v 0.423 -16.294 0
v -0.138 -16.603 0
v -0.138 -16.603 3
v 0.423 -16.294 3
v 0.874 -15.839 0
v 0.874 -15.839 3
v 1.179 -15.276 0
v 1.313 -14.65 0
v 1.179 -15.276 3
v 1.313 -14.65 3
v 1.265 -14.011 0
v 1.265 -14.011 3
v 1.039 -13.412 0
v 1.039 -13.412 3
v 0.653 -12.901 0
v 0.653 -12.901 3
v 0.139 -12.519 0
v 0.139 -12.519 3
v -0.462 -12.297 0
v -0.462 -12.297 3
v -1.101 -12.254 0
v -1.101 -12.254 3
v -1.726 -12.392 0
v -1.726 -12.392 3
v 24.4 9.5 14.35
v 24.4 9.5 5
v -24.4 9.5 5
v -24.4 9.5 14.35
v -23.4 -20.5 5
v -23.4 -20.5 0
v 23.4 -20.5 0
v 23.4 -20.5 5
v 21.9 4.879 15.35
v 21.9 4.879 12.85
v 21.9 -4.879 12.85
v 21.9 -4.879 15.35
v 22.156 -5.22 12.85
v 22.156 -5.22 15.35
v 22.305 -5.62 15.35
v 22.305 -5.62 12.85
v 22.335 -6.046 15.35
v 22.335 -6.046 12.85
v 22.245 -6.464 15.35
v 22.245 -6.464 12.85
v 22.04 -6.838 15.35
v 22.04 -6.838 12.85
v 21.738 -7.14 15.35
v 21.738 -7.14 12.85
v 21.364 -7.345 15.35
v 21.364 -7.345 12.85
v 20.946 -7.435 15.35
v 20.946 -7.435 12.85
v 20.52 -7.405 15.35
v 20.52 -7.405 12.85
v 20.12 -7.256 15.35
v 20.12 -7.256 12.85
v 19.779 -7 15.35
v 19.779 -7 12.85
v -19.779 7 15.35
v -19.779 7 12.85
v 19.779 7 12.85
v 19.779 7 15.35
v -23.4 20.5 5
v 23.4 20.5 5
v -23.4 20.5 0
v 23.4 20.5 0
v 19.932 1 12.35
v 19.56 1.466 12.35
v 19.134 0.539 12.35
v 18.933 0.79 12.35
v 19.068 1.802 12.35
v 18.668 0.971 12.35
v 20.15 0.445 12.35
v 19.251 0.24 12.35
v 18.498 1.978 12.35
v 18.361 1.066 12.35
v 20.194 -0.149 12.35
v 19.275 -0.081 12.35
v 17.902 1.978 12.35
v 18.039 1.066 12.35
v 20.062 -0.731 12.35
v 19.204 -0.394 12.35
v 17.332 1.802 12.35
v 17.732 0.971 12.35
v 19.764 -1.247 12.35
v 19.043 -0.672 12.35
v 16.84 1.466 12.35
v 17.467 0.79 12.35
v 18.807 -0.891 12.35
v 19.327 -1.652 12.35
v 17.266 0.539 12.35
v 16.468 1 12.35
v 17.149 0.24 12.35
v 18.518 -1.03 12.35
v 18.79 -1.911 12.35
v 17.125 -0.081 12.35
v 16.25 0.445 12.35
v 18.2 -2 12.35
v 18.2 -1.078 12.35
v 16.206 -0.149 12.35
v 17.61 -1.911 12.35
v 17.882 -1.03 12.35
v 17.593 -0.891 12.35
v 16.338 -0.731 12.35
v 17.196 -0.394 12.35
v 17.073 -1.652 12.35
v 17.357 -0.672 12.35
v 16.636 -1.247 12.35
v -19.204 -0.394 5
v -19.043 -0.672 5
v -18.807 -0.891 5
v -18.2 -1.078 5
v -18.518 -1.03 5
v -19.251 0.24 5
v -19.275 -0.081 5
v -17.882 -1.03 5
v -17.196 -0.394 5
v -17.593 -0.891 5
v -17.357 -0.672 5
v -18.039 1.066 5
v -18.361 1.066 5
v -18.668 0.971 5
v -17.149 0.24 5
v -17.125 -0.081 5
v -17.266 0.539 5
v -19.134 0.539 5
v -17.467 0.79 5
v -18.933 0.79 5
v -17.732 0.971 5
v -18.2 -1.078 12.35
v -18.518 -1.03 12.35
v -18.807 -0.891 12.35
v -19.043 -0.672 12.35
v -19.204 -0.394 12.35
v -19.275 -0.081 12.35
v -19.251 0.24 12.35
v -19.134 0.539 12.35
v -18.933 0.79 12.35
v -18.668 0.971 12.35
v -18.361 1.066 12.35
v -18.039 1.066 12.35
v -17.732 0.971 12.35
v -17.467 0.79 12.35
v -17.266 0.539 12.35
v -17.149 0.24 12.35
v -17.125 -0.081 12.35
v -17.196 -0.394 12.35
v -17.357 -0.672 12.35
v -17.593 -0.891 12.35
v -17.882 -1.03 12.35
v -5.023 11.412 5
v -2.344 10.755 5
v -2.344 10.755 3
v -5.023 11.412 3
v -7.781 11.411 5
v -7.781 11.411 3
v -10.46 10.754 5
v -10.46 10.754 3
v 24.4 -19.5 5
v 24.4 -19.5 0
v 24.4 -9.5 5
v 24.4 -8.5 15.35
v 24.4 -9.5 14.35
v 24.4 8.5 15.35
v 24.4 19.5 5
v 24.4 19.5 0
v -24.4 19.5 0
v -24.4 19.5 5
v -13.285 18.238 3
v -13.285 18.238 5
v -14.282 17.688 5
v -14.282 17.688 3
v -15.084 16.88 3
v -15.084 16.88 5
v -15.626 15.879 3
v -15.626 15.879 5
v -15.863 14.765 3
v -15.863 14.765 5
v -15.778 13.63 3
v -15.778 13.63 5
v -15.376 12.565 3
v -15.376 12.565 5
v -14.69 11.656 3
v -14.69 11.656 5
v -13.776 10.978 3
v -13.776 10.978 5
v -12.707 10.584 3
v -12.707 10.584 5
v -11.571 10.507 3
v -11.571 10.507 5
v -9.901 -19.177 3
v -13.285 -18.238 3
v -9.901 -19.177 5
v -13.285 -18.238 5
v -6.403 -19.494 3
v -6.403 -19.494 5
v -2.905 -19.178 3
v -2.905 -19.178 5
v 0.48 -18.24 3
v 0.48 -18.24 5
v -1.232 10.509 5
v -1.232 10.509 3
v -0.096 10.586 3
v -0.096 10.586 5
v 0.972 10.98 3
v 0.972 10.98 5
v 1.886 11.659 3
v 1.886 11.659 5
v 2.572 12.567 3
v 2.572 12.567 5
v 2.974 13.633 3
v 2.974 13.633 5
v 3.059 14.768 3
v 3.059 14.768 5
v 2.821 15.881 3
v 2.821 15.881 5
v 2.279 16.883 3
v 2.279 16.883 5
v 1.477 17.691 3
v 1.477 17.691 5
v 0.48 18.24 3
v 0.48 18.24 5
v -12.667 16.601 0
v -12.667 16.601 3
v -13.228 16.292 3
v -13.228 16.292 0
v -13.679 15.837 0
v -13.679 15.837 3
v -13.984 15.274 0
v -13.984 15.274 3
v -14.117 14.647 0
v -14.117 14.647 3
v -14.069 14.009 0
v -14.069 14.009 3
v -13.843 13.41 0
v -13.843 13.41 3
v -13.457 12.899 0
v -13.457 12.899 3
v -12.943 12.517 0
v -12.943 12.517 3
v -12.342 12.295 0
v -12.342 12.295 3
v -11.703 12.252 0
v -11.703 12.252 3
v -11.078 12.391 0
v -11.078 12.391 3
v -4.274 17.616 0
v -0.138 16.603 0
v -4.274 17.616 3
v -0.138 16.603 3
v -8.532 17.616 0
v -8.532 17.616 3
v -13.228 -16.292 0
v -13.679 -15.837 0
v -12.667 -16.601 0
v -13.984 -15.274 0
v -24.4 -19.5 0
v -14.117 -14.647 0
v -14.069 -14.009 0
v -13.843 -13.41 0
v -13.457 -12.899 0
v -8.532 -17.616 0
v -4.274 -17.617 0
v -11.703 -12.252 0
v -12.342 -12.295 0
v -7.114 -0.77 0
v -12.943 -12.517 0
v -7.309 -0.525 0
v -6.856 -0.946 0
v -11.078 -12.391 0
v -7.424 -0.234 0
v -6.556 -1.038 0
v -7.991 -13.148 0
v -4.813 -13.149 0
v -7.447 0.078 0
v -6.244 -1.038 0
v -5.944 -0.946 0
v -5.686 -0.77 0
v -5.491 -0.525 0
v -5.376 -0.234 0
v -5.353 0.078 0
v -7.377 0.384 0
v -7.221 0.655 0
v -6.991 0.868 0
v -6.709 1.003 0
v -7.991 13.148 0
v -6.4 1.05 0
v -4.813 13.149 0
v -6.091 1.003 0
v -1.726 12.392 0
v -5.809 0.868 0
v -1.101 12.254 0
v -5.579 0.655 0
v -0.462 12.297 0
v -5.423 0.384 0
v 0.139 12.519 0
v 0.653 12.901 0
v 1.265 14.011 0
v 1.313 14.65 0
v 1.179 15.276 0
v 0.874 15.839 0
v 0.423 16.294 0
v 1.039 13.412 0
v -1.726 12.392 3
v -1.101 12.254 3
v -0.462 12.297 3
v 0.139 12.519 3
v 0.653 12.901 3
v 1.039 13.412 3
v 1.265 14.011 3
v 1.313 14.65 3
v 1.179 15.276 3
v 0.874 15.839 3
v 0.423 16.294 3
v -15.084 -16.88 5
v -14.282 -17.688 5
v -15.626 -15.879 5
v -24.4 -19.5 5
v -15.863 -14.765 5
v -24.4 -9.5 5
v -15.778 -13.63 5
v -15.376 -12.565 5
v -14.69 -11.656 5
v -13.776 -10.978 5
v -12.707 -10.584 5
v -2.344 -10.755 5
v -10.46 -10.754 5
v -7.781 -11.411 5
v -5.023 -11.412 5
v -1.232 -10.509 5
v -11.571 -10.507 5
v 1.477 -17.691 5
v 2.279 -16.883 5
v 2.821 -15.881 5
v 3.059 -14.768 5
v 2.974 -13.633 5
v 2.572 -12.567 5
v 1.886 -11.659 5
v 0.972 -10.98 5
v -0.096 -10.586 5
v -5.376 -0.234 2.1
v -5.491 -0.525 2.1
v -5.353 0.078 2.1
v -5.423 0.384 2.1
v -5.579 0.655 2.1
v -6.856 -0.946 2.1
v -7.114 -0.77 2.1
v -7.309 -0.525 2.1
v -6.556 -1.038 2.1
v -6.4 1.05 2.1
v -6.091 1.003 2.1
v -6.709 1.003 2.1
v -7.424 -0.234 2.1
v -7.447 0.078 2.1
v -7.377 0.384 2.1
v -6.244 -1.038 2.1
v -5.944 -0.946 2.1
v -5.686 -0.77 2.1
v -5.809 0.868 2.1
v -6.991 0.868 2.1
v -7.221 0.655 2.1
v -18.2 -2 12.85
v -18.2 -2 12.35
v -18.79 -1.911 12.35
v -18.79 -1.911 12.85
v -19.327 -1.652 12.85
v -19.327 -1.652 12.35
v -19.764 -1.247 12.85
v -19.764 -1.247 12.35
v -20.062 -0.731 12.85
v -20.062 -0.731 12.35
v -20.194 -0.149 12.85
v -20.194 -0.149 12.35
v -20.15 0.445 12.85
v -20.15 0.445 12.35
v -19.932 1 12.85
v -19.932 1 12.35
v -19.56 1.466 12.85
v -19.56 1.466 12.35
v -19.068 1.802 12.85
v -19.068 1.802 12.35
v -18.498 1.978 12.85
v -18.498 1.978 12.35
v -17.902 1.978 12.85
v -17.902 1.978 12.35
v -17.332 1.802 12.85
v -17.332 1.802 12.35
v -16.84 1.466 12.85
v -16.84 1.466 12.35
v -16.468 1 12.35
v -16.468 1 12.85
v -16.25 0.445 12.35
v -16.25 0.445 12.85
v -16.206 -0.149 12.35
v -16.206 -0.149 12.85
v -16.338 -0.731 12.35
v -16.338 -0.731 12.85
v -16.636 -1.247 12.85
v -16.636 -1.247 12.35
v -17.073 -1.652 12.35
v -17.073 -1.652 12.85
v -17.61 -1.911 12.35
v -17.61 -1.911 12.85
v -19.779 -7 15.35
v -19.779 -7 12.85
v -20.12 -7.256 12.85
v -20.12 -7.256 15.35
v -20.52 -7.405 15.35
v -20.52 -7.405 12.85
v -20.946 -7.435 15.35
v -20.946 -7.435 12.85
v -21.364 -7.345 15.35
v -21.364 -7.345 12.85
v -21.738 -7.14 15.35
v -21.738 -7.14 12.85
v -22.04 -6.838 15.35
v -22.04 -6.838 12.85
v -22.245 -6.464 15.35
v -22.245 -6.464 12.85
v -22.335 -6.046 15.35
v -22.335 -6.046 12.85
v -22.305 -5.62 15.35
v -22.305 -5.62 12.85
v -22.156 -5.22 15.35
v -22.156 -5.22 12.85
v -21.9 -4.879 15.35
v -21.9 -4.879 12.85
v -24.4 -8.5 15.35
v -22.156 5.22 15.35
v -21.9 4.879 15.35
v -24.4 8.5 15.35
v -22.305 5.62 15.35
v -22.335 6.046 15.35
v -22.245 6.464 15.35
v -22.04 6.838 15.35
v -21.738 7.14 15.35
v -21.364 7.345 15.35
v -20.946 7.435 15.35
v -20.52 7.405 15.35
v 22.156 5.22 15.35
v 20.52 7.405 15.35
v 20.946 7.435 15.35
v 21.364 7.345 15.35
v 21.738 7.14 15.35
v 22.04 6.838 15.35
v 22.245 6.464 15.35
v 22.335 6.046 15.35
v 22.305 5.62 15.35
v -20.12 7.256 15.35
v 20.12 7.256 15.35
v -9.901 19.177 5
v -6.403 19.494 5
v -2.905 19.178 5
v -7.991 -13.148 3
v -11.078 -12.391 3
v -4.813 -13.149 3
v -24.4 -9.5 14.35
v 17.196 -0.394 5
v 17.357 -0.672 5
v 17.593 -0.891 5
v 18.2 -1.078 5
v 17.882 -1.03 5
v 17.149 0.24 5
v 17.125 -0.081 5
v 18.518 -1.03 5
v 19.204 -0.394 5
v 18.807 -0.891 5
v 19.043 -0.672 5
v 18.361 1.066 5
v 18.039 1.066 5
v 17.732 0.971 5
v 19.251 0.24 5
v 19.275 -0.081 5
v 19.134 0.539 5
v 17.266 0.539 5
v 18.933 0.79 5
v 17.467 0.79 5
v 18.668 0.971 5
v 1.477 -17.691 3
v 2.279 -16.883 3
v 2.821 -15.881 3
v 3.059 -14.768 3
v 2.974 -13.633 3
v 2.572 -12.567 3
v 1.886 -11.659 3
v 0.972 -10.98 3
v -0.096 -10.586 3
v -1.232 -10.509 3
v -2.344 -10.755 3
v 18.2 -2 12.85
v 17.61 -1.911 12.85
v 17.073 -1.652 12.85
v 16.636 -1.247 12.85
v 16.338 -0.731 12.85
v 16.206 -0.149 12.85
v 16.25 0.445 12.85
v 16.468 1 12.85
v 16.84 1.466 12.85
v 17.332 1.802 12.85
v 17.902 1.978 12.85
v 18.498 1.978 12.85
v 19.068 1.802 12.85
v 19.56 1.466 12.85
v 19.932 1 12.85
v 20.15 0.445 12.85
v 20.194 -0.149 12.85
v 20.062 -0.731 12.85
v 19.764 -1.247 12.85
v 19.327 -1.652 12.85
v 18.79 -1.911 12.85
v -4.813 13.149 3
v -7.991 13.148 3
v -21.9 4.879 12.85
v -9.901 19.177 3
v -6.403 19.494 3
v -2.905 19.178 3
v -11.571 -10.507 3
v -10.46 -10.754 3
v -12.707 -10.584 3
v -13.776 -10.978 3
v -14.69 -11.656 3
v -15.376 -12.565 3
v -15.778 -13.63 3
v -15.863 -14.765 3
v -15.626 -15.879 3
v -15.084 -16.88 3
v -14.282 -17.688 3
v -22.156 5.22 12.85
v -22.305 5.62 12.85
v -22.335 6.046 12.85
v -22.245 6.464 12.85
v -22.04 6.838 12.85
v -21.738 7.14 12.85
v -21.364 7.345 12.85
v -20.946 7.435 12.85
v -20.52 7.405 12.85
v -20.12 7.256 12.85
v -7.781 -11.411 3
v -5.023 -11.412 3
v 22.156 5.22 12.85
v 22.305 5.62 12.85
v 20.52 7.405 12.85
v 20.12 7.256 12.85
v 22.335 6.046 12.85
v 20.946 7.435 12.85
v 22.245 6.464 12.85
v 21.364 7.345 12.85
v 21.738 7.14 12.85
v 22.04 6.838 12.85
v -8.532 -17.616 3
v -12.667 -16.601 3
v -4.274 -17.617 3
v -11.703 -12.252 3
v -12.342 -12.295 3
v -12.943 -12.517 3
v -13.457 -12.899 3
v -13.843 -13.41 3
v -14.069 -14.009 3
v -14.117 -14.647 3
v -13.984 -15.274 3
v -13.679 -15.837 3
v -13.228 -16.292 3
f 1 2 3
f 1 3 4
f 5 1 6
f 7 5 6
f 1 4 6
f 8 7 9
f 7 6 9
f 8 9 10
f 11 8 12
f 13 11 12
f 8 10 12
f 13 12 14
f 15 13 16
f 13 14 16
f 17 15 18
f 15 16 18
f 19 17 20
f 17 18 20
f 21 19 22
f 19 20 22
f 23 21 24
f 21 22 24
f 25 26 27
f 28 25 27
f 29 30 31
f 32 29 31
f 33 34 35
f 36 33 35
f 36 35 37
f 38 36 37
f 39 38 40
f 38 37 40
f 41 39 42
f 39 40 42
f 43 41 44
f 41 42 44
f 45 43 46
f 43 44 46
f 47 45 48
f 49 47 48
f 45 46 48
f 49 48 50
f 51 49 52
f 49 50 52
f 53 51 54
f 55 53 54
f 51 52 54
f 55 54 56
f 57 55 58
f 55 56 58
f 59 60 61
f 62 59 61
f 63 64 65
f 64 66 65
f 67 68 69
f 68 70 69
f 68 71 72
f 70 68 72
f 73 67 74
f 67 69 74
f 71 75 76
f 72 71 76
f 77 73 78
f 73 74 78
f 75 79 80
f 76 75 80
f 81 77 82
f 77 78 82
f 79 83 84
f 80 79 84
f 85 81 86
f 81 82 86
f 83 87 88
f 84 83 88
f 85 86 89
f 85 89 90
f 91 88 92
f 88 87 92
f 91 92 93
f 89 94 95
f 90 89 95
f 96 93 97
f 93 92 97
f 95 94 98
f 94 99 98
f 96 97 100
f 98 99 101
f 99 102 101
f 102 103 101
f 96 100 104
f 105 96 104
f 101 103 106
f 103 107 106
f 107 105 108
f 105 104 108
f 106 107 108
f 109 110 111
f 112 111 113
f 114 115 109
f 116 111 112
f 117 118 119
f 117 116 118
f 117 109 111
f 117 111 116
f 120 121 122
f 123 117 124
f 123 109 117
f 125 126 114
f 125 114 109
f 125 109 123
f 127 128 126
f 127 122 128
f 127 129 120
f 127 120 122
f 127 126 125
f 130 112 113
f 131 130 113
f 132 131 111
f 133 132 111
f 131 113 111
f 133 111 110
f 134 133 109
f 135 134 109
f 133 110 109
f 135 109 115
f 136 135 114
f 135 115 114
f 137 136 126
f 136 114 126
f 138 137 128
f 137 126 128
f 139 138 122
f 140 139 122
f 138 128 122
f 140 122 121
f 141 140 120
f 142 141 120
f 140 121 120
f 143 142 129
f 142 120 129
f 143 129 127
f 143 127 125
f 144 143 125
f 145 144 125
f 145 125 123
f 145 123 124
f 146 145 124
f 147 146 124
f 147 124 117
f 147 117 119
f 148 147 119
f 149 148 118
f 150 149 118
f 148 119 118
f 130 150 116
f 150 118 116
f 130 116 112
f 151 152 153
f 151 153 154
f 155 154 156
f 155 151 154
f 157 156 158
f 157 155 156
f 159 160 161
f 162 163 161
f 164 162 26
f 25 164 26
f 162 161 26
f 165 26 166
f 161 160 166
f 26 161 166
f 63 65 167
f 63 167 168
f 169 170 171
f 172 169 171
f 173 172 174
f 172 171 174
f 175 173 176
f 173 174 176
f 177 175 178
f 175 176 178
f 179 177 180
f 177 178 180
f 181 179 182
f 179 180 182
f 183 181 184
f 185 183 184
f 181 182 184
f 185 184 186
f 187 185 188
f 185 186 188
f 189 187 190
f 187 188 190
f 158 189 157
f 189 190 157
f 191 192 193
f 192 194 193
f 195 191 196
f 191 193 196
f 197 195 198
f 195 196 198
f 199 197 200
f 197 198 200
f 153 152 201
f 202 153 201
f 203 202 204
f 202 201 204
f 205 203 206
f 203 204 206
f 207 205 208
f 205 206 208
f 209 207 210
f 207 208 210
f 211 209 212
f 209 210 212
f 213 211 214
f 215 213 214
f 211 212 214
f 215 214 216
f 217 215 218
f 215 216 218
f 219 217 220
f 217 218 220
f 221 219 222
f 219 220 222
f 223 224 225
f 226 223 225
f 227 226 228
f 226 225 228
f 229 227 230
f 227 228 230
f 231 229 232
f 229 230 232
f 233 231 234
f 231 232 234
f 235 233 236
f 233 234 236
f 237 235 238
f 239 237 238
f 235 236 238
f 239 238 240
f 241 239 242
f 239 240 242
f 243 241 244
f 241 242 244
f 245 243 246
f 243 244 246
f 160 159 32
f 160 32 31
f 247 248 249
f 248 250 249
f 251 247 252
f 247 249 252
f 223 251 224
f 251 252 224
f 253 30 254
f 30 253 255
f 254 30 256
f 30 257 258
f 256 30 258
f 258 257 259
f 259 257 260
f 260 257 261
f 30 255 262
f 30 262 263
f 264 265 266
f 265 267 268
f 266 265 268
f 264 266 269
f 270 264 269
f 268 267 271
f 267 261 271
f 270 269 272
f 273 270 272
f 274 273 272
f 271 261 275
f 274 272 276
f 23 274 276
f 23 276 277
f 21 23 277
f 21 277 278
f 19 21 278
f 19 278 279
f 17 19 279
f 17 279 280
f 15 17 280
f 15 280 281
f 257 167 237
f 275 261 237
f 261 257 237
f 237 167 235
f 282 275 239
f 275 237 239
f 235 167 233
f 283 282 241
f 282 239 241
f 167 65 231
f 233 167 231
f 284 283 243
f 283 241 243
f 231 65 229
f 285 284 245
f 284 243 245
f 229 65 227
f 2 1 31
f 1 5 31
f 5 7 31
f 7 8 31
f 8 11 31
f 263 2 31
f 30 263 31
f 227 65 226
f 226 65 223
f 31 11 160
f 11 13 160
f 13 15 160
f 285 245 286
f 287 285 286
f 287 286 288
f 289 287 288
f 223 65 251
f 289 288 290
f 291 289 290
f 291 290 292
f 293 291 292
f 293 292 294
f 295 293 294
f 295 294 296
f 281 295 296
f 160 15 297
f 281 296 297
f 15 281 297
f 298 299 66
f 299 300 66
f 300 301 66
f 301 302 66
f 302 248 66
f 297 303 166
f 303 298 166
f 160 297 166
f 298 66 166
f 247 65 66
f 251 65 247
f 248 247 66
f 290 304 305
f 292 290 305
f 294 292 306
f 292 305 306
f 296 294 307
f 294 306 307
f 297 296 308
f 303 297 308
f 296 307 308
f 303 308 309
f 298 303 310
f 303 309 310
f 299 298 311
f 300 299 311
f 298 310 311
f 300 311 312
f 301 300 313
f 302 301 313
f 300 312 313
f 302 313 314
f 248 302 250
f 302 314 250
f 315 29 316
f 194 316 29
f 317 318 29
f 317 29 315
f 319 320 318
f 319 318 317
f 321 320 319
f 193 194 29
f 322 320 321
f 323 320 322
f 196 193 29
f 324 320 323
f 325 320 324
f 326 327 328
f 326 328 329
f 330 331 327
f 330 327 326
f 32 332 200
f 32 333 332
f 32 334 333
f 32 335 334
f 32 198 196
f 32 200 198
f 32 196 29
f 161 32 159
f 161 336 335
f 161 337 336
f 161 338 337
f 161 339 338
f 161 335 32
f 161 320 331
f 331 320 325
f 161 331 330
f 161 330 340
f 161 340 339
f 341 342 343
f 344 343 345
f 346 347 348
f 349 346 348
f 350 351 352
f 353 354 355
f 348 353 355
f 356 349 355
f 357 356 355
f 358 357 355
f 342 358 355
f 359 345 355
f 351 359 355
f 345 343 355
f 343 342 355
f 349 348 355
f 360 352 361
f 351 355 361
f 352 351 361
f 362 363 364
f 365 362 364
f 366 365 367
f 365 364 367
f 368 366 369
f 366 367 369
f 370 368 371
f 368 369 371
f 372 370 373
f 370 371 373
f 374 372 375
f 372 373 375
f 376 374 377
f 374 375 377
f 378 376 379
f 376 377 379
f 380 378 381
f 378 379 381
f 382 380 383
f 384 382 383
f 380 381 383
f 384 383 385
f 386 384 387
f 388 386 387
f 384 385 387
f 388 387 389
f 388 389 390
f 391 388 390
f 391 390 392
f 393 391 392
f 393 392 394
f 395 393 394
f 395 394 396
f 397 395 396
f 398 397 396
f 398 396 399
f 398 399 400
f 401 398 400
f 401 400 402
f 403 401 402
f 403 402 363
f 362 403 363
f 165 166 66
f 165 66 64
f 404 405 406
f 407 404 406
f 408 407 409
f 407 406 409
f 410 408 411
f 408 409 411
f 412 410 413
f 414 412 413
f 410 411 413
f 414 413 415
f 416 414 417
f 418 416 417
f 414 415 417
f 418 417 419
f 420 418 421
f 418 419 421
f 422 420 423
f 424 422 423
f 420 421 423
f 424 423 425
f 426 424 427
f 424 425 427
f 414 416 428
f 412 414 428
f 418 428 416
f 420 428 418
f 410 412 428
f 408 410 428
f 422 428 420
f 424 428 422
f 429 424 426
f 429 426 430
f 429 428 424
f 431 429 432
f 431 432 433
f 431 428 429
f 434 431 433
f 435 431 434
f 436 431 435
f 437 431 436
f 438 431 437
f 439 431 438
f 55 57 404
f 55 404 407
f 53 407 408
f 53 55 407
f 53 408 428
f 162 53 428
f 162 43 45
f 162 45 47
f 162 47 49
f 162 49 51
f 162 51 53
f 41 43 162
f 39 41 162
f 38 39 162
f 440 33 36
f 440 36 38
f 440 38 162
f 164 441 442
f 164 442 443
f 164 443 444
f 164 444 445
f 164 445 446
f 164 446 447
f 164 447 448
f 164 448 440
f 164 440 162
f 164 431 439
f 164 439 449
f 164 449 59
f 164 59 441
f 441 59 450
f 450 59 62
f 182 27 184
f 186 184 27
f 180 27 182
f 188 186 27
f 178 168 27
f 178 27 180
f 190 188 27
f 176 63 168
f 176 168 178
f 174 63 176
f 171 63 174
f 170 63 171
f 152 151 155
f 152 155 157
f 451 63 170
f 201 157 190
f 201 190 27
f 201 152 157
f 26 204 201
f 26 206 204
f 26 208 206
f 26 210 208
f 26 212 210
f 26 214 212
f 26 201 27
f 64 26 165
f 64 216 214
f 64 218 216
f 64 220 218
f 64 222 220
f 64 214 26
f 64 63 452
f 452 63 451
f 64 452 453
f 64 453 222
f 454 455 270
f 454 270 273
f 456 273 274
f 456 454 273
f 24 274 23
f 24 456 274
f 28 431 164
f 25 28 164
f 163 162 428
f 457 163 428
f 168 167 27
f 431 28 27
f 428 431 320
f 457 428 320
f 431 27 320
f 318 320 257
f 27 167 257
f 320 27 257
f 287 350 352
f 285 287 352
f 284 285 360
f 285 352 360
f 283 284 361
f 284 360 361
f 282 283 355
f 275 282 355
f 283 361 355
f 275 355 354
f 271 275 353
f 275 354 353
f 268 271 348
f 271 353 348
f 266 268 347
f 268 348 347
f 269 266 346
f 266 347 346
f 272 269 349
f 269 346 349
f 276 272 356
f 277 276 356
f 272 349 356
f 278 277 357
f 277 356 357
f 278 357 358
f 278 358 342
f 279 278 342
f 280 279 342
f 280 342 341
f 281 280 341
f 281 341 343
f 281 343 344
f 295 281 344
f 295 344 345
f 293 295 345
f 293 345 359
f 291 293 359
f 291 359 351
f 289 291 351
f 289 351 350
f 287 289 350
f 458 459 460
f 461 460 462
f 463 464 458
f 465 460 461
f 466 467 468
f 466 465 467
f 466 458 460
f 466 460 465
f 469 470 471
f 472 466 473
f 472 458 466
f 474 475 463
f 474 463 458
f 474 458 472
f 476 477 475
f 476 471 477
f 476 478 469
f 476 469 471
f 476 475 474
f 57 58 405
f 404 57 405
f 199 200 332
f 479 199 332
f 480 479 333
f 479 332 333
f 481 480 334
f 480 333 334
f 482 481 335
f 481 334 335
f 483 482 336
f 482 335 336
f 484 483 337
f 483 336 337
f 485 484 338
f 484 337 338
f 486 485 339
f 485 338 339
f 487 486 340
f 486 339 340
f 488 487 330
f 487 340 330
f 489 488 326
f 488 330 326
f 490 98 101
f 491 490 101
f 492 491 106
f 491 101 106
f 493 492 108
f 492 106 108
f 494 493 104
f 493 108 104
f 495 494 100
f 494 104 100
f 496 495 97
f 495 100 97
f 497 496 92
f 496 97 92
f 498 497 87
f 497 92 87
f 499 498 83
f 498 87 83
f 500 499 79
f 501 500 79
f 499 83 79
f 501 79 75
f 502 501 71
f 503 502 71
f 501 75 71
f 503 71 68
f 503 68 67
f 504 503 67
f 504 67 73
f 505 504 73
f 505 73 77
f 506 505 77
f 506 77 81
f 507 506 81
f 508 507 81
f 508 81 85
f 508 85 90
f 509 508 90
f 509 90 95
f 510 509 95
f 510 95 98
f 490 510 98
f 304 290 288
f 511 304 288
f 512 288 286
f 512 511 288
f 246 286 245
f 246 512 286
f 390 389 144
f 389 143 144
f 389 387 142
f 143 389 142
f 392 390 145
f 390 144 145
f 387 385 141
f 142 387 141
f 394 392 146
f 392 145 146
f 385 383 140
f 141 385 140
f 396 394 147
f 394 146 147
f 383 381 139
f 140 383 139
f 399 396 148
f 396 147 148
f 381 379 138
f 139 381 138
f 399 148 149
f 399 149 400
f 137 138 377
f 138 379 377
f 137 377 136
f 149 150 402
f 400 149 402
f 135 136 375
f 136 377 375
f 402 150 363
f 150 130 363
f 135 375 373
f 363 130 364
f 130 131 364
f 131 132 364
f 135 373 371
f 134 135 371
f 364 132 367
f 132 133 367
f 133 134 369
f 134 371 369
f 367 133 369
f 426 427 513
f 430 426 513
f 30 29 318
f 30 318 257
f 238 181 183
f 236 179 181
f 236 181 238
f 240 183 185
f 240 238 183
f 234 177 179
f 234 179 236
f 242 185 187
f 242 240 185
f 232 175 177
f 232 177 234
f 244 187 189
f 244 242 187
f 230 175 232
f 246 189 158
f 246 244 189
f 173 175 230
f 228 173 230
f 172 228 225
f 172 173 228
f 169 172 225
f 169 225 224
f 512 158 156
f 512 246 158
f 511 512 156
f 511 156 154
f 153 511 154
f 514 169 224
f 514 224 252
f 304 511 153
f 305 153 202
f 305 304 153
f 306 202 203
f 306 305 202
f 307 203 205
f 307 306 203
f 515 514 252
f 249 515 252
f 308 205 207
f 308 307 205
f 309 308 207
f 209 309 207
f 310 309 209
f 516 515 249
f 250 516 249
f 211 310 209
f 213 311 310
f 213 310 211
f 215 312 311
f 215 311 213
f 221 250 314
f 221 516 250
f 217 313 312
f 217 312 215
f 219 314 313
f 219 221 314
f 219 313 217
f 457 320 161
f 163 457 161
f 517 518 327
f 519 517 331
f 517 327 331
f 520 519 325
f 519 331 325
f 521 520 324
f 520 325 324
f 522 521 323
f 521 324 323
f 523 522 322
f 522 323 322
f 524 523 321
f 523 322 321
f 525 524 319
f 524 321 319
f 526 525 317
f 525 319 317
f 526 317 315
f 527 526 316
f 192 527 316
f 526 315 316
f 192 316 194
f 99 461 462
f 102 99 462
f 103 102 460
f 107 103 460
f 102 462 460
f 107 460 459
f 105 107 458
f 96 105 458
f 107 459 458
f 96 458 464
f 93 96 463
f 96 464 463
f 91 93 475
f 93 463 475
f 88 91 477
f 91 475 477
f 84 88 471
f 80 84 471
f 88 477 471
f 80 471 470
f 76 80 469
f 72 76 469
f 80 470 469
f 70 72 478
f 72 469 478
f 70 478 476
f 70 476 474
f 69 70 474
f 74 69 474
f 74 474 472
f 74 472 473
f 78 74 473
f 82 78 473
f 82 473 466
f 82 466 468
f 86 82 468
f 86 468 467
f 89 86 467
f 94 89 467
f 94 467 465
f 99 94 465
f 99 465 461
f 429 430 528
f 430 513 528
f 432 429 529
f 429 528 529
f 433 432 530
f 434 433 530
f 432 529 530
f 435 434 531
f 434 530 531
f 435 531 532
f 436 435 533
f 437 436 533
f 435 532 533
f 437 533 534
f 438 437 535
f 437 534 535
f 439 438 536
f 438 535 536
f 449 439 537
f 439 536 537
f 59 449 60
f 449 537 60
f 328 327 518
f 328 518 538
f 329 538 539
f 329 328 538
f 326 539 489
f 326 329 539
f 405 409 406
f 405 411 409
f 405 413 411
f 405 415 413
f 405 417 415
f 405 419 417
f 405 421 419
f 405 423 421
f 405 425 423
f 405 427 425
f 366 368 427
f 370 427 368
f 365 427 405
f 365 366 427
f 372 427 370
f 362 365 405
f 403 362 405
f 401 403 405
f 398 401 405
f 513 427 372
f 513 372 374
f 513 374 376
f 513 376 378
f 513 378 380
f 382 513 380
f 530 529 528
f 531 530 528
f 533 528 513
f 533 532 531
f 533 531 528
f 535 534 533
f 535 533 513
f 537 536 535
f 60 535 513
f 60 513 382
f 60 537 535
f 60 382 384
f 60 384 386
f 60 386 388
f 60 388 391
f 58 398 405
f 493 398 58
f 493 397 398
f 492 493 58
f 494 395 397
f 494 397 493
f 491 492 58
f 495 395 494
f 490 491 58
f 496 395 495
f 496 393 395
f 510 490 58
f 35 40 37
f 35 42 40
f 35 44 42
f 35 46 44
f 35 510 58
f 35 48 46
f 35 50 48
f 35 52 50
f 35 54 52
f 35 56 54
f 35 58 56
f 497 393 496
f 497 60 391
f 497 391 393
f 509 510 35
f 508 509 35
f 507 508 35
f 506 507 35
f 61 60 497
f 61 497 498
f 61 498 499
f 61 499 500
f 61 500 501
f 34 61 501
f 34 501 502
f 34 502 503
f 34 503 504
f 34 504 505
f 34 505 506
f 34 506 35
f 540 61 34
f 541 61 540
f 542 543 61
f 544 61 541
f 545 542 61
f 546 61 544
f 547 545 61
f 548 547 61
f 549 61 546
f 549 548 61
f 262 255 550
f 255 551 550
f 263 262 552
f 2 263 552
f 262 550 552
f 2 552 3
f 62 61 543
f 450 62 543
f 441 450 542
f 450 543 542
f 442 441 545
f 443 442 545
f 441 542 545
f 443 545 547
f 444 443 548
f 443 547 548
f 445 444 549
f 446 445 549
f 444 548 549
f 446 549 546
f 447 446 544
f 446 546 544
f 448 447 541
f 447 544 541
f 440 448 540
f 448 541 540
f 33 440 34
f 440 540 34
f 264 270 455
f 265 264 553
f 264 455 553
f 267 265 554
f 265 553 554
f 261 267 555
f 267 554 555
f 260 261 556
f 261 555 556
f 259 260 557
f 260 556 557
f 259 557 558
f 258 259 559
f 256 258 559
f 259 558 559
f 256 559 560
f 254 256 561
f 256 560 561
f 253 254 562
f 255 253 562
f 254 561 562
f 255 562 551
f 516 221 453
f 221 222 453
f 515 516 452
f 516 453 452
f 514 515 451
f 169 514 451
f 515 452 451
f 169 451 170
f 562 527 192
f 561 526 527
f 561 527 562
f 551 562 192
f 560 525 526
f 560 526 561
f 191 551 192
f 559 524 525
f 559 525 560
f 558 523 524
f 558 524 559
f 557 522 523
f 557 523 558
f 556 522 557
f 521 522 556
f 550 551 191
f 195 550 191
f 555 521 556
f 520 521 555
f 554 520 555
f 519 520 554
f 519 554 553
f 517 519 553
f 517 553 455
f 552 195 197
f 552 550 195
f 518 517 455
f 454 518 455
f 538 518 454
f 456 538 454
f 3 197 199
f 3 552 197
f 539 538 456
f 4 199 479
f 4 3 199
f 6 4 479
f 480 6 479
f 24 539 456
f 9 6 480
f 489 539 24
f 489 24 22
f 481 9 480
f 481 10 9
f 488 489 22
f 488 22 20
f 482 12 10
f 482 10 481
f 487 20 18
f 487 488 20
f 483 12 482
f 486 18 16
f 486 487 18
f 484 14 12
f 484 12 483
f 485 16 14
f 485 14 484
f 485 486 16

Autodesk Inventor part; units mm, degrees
ref_plane "YZ Plane" through (0, 0, 0) normal (1, 0, 0) x (0, 1, 0)
ref_plane "XZ Plane" through (0, 0, 0) normal (0, 1, 0) x (-1, 0, 0)
ref_plane "XY Plane" through (0, 0, 0) normal (0, 0, 1) x (1, 0, 0)
sketch "Sketch1" plane through (0, 0, 0) normal (0, 0, 1) x (1, 0, 0)
  line L0 (-24.4, -9.5) -> (24.4, -9.5)
  line L1 (24.4, -9.5) -> (24.4, 9.5)
  line L2 (24.4, 9.5) -> (-24.4, 9.5)
  line L3 (-24.4, 9.5) -> (-24.4, -9.5)
  line L4 (-24.4, -9.5) -> (24.4, 9.5) construction
  line L5 (24.4, -9.5) -> (-24.4, 9.5) construction
  point P0 (0, 0)
  dimension "LENGTH" = 48.8
  dimension "WIDTH" = 19
extrude "Extrusion1" add sketch "Sketch1" along normal blind 12.85
sketch "Sketch2" plane through (0, 0, 12.85) normal (0, 0, 1) x (1, 0, 0)
  point P0 (0, 0)
  point P1 (-18.2, 0)
  point P2 (18.2, 0)
  dimension "d11" = 0
  dimension "d12" = 0
  dimension "d13" = 36.4
  dimension "d14" = 18.2
hole "Hole1" at (-18.2, 0, 12.85) at (18.2, 0, 12.85) direction (0, 0, -1) diameter 2.1565 depth 8.87 thread size "4-40 UNC" class "2B" standard "ANSI Unified Screw Threads"
sketch "Sketch3" plane through (0, 0, 12.85) normal (0, 0, 1) x (1, 0, 0)
  point P0 (0, 0)
  point P1 (0, 0)
  dimension "d22" = 0
  dimension "d23" = 0
hole "Hole2" [suppressed]
sketch "Sketch4" plane through (0, 0, 0) normal (0, 0, -1) x (-1, 0, 0)
  line L0 (5.5, 0) -> (4.5, 0) construction
  line L1 (5.5, 1.05) -> (4.5, 1.05)
  line L2 (4.5, -1.05) -> (5.5, -1.05)
  arc A0 (5.5, -1.05) -> (5.5, 1.05) centre (5.5, 0) ccw
  arc A1 (4.5, 1.05) -> (4.5, -1.05) centre (4.5, 0) ccw
  point P0 (0, 0)
  point P1 (-5, 0)
  point P2 (5, 0)
  dimension "d24" = 1
  dimension "d25" = 0
  dimension "d26" = 0
  dimension "d27" = 10
  dimension "d28" = 5
  dimension "d29" = 1.05
hole "Hole3" [suppressed]
extrude "Extrusion2" [suppressed]
sketch "Sketch5" plane through (0, 0, 0) normal (0, 0, 1) x (1, 0, 0)
  line L0 (-24.4, -20.5) -> (24.4, -20.5)
  line L1 (24.4, -20.5) -> (24.4, 20.5)
  line L2 (24.4, 20.5) -> (-24.4, 20.5)
  line L3 (-24.4, 20.5) -> (-24.4, -20.5)
  line L4 (-24.4, -20.5) -> (24.4, 20.5) construction
  line L5 (24.4, -20.5) -> (-24.4, 20.5) construction
  point P0 (0, 0)
  dimension "d39" = 48.8
  dimension "d40" = 41
extrude "Extrusion3" add sketch "Sketch5" along normal blind 5
sketch "Sketch7" plane through (0, 0, 12.85) normal (0, 0, 1) x (1, 0, 0)
  circle A0 centre (18.2, 0) radius 1.0782 projected
  circle A1 centre (-18.2, 0) radius 1.0782 projected
  point P0 (0, 0)
  dimension "d54" = 0
  dimension "d55" = 0
  dimension "d56" = 0
  dimension "d57" = 0
hole "Hole5" at (18.2, 0, 12.85) at (-18.2, 0, 12.85) direction (0, 0, -1) diameter 4 depth 0.5
chamfer "Chamfer2" distance 1 angle 45 4 edges at (24.4, -20.5, 2.5) (24.4, 20.5, 2.5) (-24.4, 20.5, 2.5) (-24.4, -20.5, 2.5)
sketch "Sketch8" plane through (0, 0, 0) normal (0, 0, -1) x (-1, 0, 0)
  line L0 (0, 5.5) -> (0, 4.5) construction
  line L1 (-1.05, 5.5) -> (-1.05, 4.5)
  line L2 (1.05, 4.5) -> (1.05, 5.5)
  arc A0 (1.05, 5.5) -> (-1.05, 5.5) centre (0, 5.5) ccw
  arc A1 (-1.05, 4.5) -> (1.05, 4.5) centre (0, 4.5) ccw
  point P0 (0, 0)
  point P1 (0, -5)
  point P2 (0, 5)
  dimension "d77" = 1
  dimension "d78" = 1.05
  dimension "d79" = 10
  dimension "d80" = 0
  dimension "d81" = 0
  dimension "d82" = 5
hole "Hole6" [suppressed]
extrude "Extrusion4" [suppressed]
sketch "Sketch9" plane through (-24.4, -19.5, 0) normal (-1, 0, 0) x (0, 0, 1)
  circle A0 centre (-12.35, 19.5) radius 12.7
  line L0 (0, 39) -> (0, 0) projected
  point P0 (0, 19.5)
  point P1 (0, 16.539)
  point P2 (0, 22.461)
  dimension "d92" = 25.4
  dimension "d93" = 0
  dimension "d94" = 12.35
extrude "Extrusion5" [suppressed]
sketch "Sketch10" plane through (0, 0, 12.85) normal (0, 0, 1) x (1, 0, 0)
  line L0 (-24.4, -9.5) -> (24.4, -9.5)
  line L1 (24.4, -9.5) -> (24.4, 9.5)
  line L2 (24.4, 9.5) -> (-24.4, 9.5)
  line L3 (-24.4, 9.5) -> (-24.4, -9.5)
  line L4 (-24.4, -9.5) -> (24.4, 9.5) construction
  line L5 (24.4, -9.5) -> (-24.4, 9.5) construction
  line L6 (21.9, -7) -> (-21.9, -7)
  line L7 (-21.9, -7) -> (-21.9, 7)
  line L8 (-21.9, 7) -> (21.9, 7)
  line L9 (21.9, 7) -> (21.9, -7)
  line L10 (21.9, -7) -> (-21.9, 7) construction
  line L11 (-21.9, -7) -> (21.9, 7) construction
  circle A0 centre (-20.8393, 5.9393) radius 1.5
  circle A1 centre (-20.8393, -5.9393) radius 1.5
  circle A2 centre (20.8393, 5.9393) radius 1.5
  circle A3 centre (20.8393, -5.9393) radius 1.5
  line L12 (20.8393, 5.9393) -> (21.9, 7)
  line L13 (21.9, -7) -> (20.8393, -5.9393)
  line L14 (-20.8393, 5.9393) -> (-21.9, 7)
  line L15 (-20.8393, -5.9393) -> (-21.9, -7)
  point P0 (0, 0)
  point P1 (21.9, -4.8787)
  point P2 (19.7787, -7)
  point P3 (-19.7787, -7)
  point P4 (-21.9, -4.8787)
  point P5 (-21.9, 4.8787)
  point P6 (-19.7787, 7)
  point P7 (19.7787, 7)
  point P8 (21.9, 4.8787)
  dimension "d106" = 3
  dimension "d110" = 3
  dimension "d111" = 3
  dimension "d112" = 3
  dimension "d97" = 48.8
  dimension "d98" = 19
  dimension "d99" = 43.8
  dimension "d100" = 14
  dimension "d107" = 45
  dimension "d108" = 45
  dimension "d109" = 45
extrude "Extrusion6" add sketch "Sketch10" along normal blind 2.5
chamfer "Chamfer5" [suppressed]
chamfer "Chamfer6" distance 1 angle 45 2 edges at (0, -9.5, 15.35) (0, 9.5, 15.35)
sketch "Sketch12" plane through (0, 0, 5) normal (0, 0, 1) x (1, 0, 0)
  arc A0 (7.9961, 15.4962) -> (-8.004, 14.5013) centre (9.4196, -136.543) ccw construction
  arc A1 (7.9587, 19.496) -> (-8.4624, 18.4749) centre (9.4196, -136.543) ccw
  arc A2 (8.0336, 11.4964) -> (-7.5457, 10.5276) centre (9.4196, -136.543) ccw
  arc A3 (8.0336, 11.4964) -> (7.9587, 19.496) centre (7.9961, 15.4962) ccw
  arc A4 (-8.4624, 18.4749) -> (-7.5457, 10.5276) centre (-8.004, 14.5013) ccw
  line L0 (24.4, 2.961) -> (24.4, -2.961)
  line L1 (24.4, 0) -> (-24.4, 0)
  line L2 (-24.4, 8.5) -> (-24.4, -8.5)
  arc A5 (7.9961, 15.4962) -> (-8.004, 14.5013) centre (9.4196, -136.543) ccw construction
  arc A6 (7.9751, 17.7461) -> (-8.2619, 16.7364) centre (9.4196, -136.543) ccw
  arc A7 (8.0172, 13.2463) -> (-7.7462, 12.2661) centre (9.4196, -136.543) ccw
  arc A8 (8.0172, 13.2463) -> (7.9751, 17.7461) centre (7.9961, 15.4962) ccw
  arc A9 (-8.2619, 16.7364) -> (-7.7462, 12.2661) centre (-8.004, 14.5013) ccw
  arc A10 (-8.004, -14.5013) -> (7.9961, -15.4962) centre (9.4196, 136.543) ccw construction
  arc A11 (-8.4624, -18.4749) -> (7.9587, -19.496) centre (9.4196, 136.543) ccw
  arc A12 (-7.5457, -10.5276) -> (8.0336, -11.4964) centre (9.4196, 136.543) ccw
  arc A13 (7.9587, -19.496) -> (8.0336, -11.4964) centre (7.9961, -15.4962) ccw
  arc A14 (-7.5457, -10.5276) -> (-8.4624, -18.4749) centre (-8.004, -14.5013) ccw
  arc A15 (-8.004, -14.5013) -> (7.9961, -15.4962) centre (9.4196, 136.543) ccw construction
  arc A16 (-8.2619, -16.7364) -> (7.9751, -17.7461) centre (9.4196, 136.543) ccw
  arc A17 (-7.7462, -12.2661) -> (8.0172, -13.2463) centre (9.4196, 136.543) ccw
  arc A18 (7.9751, -17.7461) -> (8.0172, -13.2463) centre (7.9961, -15.4962) ccw
  arc A19 (-7.7462, -12.2661) -> (-8.2619, -16.7364) centre (-8.004, -14.5013) ccw
  point P0 (0, 0)
  point P1 (-8.004, 12.753)
  point P2 (7.9961, 17.2527)
  point P3 (-6.4165, 14.3405)
  point P4 (9.5836, 18.8402)
  point P5 (-8.004, -12.753)
  point P6 (7.9961, -17.2527)
  point P7 (9.5836, -18.8402)
  point P8 (-6.4165, -14.3405)
  dimension "d118" = 8
  dimension "d122" = 4.5
extrude "Extrusion12" [suppressed]
extrude "Extrusion13" [suppressed]
sketch "Sketch14" plane through (0, 0, 0) normal (0, 0, -1) x (-1, 0, 0)
  point P0 (0, 0)
  point P1 (6.4, 0)
hole "Hole7" at (-6.4, 0, 0) direction (0, 0, 1) diameter 2.1 depth 2.1
sketch "Sketch15" plane through (0, 0, 0) normal (0, 0, -1) x (-1, 0, 0)
  circle A0 centre (6.4, 0) radius 1.05 projected
  circle A1 centre (6.4, 0) radius 19.5
  circle A2 centre (6.4, 0) radius 11.5
  circle A3 centre (6.4, 0) radius 17.75
  circle A4 centre (6.4, 0) radius 13.25
  line L0 (-24.4, 9.5) -> (24.4, 9.5) projected
  line L1 (24.4, 9.5) -> (-24.4, 9.5)
  line L2 (-24.4, -19.5) -> (-24.4, 19.5) projected
  line L3 (24.4, -9.5) -> (-24.4, -9.5) projected
  line L4 (24.4, -9.5) -> (-24.4, -9.5)
  arc A5 (9.3371, 17.5053) -> (5.1369, 17.705) centre (6.4, 0) ccw
  arc A6 (8.5925, 13.0673) -> (5.4572, 13.2164) centre (6.4, 0) ccw
  arc A7 (13.9857, 17.9641) -> (-1.4292, 17.8592) centre (6.4, 0) ccw
  arc A8 (10.8736, 10.5942) -> (1.7828, 10.5324) centre (6.4, 0) ccw
  arc A9 (11.8707, 14.5025) -> (0.9294, 14.5025) centre (6.4, 0) ccw construction
  arc A10 (13.2825, 18.2451) -> (-0.4824, 18.2451) centre (6.4, 0) ccw
  arc A11 (10.4589, 10.7599) -> (2.3412, 10.7599) centre (6.4, 0) ccw
  arc A12 (10.4589, 10.7599) -> (13.2825, 18.2451) centre (11.8707, 14.5025) ccw
  arc A13 (-0.4824, 18.2451) -> (2.3412, 10.7599) centre (0.9294, 14.5025) ccw
  arc A14 (11.8707, 14.5025) -> (0.9294, 14.5025) centre (6.4, 0) ccw construction
  arc A15 (12.6648, 16.6077) -> (0.1352, 16.6077) centre (6.4, 0) ccw
  arc A16 (11.0766, 12.3973) -> (1.7235, 12.3973) centre (6.4, 0) ccw
  arc A17 (11.0766, 12.3973) -> (12.6648, 16.6077) centre (11.8707, 14.5025) ccw
  arc A18 (0.1352, 16.6077) -> (1.7235, 12.3973) centre (0.9294, 14.5025) ccw
  line L5 (24.4, 8.5) -> (24.4, -8.5) projected
  line L6 (24.4, 0) -> (-24.4, 0)
  arc A19 (5.1369, -17.705) -> (9.3371, -17.5053) centre (6.4, 0) ccw
  arc A20 (5.4572, -13.2164) -> (8.5925, -13.0673) centre (6.4, 0) ccw
  arc A21 (-1.4292, -17.8592) -> (13.9857, -17.9641) centre (6.4, 0) ccw
  arc A22 (1.7828, -10.5324) -> (10.8736, -10.5942) centre (6.4, 0) ccw
  arc A23 (0.9294, -14.5025) -> (11.8707, -14.5025) centre (6.4, 0) ccw construction
  arc A24 (-0.4824, -18.2451) -> (13.2825, -18.2451) centre (6.4, 0) ccw
  arc A25 (2.3412, -10.7599) -> (10.4589, -10.7599) centre (6.4, 0) ccw
  arc A26 (13.2825, -18.2451) -> (10.4589, -10.7599) centre (11.8707, -14.5025) ccw
  arc A27 (2.3412, -10.7599) -> (-0.4824, -18.2451) centre (0.9294, -14.5025) ccw
  arc A28 (0.9294, -14.5025) -> (11.8707, -14.5025) centre (6.4, 0) ccw construction
  arc A29 (0.1352, -16.6077) -> (12.6648, -16.6077) centre (6.4, 0) ccw
  arc A30 (1.7235, -12.3973) -> (11.0766, -12.3973) centre (6.4, 0) ccw
  arc A31 (12.6648, -16.6077) -> (11.0766, -12.3973) centre (11.8707, -14.5025) ccw
  arc A32 (1.7235, -12.3973) -> (0.1352, -16.6077) centre (0.9294, -14.5025) ccw
  point P0 (0, 0)
  point P1 (6.4, 15.5)
  point P2 (6.4, -15.5)
  dimension "d140" = 39
  dimension "d141" = 23
  dimension "d142" = 35.5
  dimension "d143" = 26.5
  dimension "d147" = 8
  dimension "d148" = 4.5
sketch "Sketch17" plane through (0, 0, 5) normal (0, 0, 1) x (1, 0, 0)
  circle A0 centre (-6.4, 0) radius 1.05 projected
  arc A1 (-11.8725, -14.4958) -> (-0.9318, -14.4974) centre (-6.4, 0) ccw construction
  arc A2 (-12.6672, -16.6008) -> (-0.1378, -16.6026) centre (-6.4, 0) ccw
  arc A3 (-11.0779, -12.3908) -> (-1.7259, -12.3922) centre (-6.4, 0) ccw
  arc A4 (-11.0779, -12.3908) -> (-12.6672, -16.6008) centre (-11.8725, -14.4958) ccw
  arc A5 (-0.1378, -16.6026) -> (-1.7259, -12.3922) centre (-0.9318, -14.4974) ccw
  arc A6 (-11.8725, -14.4958) -> (-0.9318, -14.4974) centre (-6.4, 0) ccw construction
  arc A7 (-13.2853, -18.238) -> (0.4798, -18.24) centre (-6.4, 0) ccw
  arc A8 (-10.4598, -10.7536) -> (-2.3435, -10.7548) centre (-6.4, 0) ccw
  arc A9 (-10.4598, -10.7536) -> (-13.2853, -18.238) centre (-11.8725, -14.4958) ccw
  arc A10 (0.4798, -18.24) -> (-2.3435, -10.7548) centre (-0.9318, -14.4974) ccw
  line L0 (-24.1444, 0) -> (24.3913, 0)
  line L1 (24.3913, 0) -> (-24.1444, 0)
  arc A11 (-0.9318, 14.4974) -> (-11.8725, 14.4958) centre (-6.4, 0) ccw construction
  arc A12 (-0.1378, 16.6026) -> (-12.6672, 16.6008) centre (-6.4, 0) ccw
  arc A13 (-1.7259, 12.3922) -> (-11.0779, 12.3908) centre (-6.4, 0) ccw
  arc A14 (-12.6672, 16.6008) -> (-11.0779, 12.3908) centre (-11.8725, 14.4958) ccw
  arc A15 (-1.7259, 12.3922) -> (-0.1378, 16.6026) centre (-0.9318, 14.4974) ccw
  arc A16 (-0.9318, 14.4974) -> (-11.8725, 14.4958) centre (-6.4, 0) ccw construction
  arc A17 (0.4798, 18.24) -> (-13.2853, 18.238) centre (-6.4, 0) ccw
  arc A18 (-2.3435, 10.7548) -> (-10.4598, 10.7536) centre (-6.4, 0) ccw
  arc A19 (-13.2853, 18.238) -> (-10.4598, 10.7536) centre (-11.8725, 14.4958) ccw
  arc A20 (-2.3435, 10.7548) -> (0.4798, 18.24) centre (-0.9318, 14.4974) ccw
  point P0 (0, 0)
  point P1 (-0.9324, -14.4958)
  point P2 (-0.9324, 14.4958)
  dimension "d149" = 4.5
  dimension "d150" = 8
extrude "Extrusion14" cut sketch "Sketch17" against normal through all contours A4 A3 A5 A2 | A15 A13 A14 A12
extrude "Extrusion15" cut sketch "Sketch17" against normal blind 2 contours A9 A8 A10 A7 | A20 A18 A19 A17
equation "\"d2\" = BEAM_HEIGHT - APERTURE_HEIGHT"
equation "\"d14\" = 0.5 * d13"
equation "\"d39\" = LENGTH"
equation "\"d106\" = d110"
equation "\"d111\" = d110"
equation "\"d112\" = d110"
equation "\"d97\" = LENGTH"
equation "\"d98\" = WIDTH"
equation "\"BEAM_HEIGHT\" = 19.05"
equation "\"APERTURE_HEIGHT\" = 6.2"
properties part number "ADAPTER_AOM-brimrose"
